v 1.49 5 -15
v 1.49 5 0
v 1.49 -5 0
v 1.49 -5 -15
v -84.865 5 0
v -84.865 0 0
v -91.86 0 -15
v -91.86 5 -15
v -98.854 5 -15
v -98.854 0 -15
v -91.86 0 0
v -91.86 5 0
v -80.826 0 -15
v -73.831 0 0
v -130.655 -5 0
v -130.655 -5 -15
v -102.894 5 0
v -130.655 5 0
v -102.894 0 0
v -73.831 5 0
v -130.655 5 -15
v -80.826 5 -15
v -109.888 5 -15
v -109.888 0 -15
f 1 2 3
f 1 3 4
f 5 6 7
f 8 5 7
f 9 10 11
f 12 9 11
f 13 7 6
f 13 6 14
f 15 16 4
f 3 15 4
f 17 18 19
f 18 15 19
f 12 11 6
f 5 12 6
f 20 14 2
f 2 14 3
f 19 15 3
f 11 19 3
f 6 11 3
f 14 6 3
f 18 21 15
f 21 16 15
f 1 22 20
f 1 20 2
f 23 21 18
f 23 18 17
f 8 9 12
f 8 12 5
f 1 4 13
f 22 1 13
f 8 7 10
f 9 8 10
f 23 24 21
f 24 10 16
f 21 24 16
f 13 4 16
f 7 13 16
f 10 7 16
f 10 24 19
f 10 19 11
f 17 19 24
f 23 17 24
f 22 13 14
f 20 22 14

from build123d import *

# Parameters (mm, degrees)
SKETCH1_W           = 132.14490548
SKETCH1_H           = 15
BOSS_EXTRUDE1_DEPTH = 5
BOSS_EXTRUDE2_DEPTH = 5


with BuildPart() as part:
    # Sketch1 → Boss-Extrude1 (new body)
    with BuildSketch(Plane(origin=(0, 0, 0), x_dir=(1, 0, 0), z_dir=(0, 1, 0))):
        with Locations((-64.5826857, 7.5)):
            Rectangle(SKETCH1_W, SKETCH1_H)
    extrude(amount=-BOSS_EXTRUDE1_DEPTH)

    # Sketch1<3> → Boss-Extrude2 (add)
    with BuildSketch(Plane(origin=(0, 0, 0), x_dir=(1, 0, 0), z_dir=(0, 1, 0))):
        Polygon((-109.888174915, 15), (-130.65513844, 15), (-130.65513844, 0), (-102.893560042, 0), align=None)
        Polygon((-91.859780853, 15), (-98.854395725, 15), (-91.859780853, 0), (-84.86516598, 0), align=None)
        Polygon((1.48976704, 15), (-80.826001663, 15), (-73.831386791, 0), (1.48976704, 0), align=None)
    extrude(amount=BOSS_EXTRUDE2_DEPTH)


solid = part.part
